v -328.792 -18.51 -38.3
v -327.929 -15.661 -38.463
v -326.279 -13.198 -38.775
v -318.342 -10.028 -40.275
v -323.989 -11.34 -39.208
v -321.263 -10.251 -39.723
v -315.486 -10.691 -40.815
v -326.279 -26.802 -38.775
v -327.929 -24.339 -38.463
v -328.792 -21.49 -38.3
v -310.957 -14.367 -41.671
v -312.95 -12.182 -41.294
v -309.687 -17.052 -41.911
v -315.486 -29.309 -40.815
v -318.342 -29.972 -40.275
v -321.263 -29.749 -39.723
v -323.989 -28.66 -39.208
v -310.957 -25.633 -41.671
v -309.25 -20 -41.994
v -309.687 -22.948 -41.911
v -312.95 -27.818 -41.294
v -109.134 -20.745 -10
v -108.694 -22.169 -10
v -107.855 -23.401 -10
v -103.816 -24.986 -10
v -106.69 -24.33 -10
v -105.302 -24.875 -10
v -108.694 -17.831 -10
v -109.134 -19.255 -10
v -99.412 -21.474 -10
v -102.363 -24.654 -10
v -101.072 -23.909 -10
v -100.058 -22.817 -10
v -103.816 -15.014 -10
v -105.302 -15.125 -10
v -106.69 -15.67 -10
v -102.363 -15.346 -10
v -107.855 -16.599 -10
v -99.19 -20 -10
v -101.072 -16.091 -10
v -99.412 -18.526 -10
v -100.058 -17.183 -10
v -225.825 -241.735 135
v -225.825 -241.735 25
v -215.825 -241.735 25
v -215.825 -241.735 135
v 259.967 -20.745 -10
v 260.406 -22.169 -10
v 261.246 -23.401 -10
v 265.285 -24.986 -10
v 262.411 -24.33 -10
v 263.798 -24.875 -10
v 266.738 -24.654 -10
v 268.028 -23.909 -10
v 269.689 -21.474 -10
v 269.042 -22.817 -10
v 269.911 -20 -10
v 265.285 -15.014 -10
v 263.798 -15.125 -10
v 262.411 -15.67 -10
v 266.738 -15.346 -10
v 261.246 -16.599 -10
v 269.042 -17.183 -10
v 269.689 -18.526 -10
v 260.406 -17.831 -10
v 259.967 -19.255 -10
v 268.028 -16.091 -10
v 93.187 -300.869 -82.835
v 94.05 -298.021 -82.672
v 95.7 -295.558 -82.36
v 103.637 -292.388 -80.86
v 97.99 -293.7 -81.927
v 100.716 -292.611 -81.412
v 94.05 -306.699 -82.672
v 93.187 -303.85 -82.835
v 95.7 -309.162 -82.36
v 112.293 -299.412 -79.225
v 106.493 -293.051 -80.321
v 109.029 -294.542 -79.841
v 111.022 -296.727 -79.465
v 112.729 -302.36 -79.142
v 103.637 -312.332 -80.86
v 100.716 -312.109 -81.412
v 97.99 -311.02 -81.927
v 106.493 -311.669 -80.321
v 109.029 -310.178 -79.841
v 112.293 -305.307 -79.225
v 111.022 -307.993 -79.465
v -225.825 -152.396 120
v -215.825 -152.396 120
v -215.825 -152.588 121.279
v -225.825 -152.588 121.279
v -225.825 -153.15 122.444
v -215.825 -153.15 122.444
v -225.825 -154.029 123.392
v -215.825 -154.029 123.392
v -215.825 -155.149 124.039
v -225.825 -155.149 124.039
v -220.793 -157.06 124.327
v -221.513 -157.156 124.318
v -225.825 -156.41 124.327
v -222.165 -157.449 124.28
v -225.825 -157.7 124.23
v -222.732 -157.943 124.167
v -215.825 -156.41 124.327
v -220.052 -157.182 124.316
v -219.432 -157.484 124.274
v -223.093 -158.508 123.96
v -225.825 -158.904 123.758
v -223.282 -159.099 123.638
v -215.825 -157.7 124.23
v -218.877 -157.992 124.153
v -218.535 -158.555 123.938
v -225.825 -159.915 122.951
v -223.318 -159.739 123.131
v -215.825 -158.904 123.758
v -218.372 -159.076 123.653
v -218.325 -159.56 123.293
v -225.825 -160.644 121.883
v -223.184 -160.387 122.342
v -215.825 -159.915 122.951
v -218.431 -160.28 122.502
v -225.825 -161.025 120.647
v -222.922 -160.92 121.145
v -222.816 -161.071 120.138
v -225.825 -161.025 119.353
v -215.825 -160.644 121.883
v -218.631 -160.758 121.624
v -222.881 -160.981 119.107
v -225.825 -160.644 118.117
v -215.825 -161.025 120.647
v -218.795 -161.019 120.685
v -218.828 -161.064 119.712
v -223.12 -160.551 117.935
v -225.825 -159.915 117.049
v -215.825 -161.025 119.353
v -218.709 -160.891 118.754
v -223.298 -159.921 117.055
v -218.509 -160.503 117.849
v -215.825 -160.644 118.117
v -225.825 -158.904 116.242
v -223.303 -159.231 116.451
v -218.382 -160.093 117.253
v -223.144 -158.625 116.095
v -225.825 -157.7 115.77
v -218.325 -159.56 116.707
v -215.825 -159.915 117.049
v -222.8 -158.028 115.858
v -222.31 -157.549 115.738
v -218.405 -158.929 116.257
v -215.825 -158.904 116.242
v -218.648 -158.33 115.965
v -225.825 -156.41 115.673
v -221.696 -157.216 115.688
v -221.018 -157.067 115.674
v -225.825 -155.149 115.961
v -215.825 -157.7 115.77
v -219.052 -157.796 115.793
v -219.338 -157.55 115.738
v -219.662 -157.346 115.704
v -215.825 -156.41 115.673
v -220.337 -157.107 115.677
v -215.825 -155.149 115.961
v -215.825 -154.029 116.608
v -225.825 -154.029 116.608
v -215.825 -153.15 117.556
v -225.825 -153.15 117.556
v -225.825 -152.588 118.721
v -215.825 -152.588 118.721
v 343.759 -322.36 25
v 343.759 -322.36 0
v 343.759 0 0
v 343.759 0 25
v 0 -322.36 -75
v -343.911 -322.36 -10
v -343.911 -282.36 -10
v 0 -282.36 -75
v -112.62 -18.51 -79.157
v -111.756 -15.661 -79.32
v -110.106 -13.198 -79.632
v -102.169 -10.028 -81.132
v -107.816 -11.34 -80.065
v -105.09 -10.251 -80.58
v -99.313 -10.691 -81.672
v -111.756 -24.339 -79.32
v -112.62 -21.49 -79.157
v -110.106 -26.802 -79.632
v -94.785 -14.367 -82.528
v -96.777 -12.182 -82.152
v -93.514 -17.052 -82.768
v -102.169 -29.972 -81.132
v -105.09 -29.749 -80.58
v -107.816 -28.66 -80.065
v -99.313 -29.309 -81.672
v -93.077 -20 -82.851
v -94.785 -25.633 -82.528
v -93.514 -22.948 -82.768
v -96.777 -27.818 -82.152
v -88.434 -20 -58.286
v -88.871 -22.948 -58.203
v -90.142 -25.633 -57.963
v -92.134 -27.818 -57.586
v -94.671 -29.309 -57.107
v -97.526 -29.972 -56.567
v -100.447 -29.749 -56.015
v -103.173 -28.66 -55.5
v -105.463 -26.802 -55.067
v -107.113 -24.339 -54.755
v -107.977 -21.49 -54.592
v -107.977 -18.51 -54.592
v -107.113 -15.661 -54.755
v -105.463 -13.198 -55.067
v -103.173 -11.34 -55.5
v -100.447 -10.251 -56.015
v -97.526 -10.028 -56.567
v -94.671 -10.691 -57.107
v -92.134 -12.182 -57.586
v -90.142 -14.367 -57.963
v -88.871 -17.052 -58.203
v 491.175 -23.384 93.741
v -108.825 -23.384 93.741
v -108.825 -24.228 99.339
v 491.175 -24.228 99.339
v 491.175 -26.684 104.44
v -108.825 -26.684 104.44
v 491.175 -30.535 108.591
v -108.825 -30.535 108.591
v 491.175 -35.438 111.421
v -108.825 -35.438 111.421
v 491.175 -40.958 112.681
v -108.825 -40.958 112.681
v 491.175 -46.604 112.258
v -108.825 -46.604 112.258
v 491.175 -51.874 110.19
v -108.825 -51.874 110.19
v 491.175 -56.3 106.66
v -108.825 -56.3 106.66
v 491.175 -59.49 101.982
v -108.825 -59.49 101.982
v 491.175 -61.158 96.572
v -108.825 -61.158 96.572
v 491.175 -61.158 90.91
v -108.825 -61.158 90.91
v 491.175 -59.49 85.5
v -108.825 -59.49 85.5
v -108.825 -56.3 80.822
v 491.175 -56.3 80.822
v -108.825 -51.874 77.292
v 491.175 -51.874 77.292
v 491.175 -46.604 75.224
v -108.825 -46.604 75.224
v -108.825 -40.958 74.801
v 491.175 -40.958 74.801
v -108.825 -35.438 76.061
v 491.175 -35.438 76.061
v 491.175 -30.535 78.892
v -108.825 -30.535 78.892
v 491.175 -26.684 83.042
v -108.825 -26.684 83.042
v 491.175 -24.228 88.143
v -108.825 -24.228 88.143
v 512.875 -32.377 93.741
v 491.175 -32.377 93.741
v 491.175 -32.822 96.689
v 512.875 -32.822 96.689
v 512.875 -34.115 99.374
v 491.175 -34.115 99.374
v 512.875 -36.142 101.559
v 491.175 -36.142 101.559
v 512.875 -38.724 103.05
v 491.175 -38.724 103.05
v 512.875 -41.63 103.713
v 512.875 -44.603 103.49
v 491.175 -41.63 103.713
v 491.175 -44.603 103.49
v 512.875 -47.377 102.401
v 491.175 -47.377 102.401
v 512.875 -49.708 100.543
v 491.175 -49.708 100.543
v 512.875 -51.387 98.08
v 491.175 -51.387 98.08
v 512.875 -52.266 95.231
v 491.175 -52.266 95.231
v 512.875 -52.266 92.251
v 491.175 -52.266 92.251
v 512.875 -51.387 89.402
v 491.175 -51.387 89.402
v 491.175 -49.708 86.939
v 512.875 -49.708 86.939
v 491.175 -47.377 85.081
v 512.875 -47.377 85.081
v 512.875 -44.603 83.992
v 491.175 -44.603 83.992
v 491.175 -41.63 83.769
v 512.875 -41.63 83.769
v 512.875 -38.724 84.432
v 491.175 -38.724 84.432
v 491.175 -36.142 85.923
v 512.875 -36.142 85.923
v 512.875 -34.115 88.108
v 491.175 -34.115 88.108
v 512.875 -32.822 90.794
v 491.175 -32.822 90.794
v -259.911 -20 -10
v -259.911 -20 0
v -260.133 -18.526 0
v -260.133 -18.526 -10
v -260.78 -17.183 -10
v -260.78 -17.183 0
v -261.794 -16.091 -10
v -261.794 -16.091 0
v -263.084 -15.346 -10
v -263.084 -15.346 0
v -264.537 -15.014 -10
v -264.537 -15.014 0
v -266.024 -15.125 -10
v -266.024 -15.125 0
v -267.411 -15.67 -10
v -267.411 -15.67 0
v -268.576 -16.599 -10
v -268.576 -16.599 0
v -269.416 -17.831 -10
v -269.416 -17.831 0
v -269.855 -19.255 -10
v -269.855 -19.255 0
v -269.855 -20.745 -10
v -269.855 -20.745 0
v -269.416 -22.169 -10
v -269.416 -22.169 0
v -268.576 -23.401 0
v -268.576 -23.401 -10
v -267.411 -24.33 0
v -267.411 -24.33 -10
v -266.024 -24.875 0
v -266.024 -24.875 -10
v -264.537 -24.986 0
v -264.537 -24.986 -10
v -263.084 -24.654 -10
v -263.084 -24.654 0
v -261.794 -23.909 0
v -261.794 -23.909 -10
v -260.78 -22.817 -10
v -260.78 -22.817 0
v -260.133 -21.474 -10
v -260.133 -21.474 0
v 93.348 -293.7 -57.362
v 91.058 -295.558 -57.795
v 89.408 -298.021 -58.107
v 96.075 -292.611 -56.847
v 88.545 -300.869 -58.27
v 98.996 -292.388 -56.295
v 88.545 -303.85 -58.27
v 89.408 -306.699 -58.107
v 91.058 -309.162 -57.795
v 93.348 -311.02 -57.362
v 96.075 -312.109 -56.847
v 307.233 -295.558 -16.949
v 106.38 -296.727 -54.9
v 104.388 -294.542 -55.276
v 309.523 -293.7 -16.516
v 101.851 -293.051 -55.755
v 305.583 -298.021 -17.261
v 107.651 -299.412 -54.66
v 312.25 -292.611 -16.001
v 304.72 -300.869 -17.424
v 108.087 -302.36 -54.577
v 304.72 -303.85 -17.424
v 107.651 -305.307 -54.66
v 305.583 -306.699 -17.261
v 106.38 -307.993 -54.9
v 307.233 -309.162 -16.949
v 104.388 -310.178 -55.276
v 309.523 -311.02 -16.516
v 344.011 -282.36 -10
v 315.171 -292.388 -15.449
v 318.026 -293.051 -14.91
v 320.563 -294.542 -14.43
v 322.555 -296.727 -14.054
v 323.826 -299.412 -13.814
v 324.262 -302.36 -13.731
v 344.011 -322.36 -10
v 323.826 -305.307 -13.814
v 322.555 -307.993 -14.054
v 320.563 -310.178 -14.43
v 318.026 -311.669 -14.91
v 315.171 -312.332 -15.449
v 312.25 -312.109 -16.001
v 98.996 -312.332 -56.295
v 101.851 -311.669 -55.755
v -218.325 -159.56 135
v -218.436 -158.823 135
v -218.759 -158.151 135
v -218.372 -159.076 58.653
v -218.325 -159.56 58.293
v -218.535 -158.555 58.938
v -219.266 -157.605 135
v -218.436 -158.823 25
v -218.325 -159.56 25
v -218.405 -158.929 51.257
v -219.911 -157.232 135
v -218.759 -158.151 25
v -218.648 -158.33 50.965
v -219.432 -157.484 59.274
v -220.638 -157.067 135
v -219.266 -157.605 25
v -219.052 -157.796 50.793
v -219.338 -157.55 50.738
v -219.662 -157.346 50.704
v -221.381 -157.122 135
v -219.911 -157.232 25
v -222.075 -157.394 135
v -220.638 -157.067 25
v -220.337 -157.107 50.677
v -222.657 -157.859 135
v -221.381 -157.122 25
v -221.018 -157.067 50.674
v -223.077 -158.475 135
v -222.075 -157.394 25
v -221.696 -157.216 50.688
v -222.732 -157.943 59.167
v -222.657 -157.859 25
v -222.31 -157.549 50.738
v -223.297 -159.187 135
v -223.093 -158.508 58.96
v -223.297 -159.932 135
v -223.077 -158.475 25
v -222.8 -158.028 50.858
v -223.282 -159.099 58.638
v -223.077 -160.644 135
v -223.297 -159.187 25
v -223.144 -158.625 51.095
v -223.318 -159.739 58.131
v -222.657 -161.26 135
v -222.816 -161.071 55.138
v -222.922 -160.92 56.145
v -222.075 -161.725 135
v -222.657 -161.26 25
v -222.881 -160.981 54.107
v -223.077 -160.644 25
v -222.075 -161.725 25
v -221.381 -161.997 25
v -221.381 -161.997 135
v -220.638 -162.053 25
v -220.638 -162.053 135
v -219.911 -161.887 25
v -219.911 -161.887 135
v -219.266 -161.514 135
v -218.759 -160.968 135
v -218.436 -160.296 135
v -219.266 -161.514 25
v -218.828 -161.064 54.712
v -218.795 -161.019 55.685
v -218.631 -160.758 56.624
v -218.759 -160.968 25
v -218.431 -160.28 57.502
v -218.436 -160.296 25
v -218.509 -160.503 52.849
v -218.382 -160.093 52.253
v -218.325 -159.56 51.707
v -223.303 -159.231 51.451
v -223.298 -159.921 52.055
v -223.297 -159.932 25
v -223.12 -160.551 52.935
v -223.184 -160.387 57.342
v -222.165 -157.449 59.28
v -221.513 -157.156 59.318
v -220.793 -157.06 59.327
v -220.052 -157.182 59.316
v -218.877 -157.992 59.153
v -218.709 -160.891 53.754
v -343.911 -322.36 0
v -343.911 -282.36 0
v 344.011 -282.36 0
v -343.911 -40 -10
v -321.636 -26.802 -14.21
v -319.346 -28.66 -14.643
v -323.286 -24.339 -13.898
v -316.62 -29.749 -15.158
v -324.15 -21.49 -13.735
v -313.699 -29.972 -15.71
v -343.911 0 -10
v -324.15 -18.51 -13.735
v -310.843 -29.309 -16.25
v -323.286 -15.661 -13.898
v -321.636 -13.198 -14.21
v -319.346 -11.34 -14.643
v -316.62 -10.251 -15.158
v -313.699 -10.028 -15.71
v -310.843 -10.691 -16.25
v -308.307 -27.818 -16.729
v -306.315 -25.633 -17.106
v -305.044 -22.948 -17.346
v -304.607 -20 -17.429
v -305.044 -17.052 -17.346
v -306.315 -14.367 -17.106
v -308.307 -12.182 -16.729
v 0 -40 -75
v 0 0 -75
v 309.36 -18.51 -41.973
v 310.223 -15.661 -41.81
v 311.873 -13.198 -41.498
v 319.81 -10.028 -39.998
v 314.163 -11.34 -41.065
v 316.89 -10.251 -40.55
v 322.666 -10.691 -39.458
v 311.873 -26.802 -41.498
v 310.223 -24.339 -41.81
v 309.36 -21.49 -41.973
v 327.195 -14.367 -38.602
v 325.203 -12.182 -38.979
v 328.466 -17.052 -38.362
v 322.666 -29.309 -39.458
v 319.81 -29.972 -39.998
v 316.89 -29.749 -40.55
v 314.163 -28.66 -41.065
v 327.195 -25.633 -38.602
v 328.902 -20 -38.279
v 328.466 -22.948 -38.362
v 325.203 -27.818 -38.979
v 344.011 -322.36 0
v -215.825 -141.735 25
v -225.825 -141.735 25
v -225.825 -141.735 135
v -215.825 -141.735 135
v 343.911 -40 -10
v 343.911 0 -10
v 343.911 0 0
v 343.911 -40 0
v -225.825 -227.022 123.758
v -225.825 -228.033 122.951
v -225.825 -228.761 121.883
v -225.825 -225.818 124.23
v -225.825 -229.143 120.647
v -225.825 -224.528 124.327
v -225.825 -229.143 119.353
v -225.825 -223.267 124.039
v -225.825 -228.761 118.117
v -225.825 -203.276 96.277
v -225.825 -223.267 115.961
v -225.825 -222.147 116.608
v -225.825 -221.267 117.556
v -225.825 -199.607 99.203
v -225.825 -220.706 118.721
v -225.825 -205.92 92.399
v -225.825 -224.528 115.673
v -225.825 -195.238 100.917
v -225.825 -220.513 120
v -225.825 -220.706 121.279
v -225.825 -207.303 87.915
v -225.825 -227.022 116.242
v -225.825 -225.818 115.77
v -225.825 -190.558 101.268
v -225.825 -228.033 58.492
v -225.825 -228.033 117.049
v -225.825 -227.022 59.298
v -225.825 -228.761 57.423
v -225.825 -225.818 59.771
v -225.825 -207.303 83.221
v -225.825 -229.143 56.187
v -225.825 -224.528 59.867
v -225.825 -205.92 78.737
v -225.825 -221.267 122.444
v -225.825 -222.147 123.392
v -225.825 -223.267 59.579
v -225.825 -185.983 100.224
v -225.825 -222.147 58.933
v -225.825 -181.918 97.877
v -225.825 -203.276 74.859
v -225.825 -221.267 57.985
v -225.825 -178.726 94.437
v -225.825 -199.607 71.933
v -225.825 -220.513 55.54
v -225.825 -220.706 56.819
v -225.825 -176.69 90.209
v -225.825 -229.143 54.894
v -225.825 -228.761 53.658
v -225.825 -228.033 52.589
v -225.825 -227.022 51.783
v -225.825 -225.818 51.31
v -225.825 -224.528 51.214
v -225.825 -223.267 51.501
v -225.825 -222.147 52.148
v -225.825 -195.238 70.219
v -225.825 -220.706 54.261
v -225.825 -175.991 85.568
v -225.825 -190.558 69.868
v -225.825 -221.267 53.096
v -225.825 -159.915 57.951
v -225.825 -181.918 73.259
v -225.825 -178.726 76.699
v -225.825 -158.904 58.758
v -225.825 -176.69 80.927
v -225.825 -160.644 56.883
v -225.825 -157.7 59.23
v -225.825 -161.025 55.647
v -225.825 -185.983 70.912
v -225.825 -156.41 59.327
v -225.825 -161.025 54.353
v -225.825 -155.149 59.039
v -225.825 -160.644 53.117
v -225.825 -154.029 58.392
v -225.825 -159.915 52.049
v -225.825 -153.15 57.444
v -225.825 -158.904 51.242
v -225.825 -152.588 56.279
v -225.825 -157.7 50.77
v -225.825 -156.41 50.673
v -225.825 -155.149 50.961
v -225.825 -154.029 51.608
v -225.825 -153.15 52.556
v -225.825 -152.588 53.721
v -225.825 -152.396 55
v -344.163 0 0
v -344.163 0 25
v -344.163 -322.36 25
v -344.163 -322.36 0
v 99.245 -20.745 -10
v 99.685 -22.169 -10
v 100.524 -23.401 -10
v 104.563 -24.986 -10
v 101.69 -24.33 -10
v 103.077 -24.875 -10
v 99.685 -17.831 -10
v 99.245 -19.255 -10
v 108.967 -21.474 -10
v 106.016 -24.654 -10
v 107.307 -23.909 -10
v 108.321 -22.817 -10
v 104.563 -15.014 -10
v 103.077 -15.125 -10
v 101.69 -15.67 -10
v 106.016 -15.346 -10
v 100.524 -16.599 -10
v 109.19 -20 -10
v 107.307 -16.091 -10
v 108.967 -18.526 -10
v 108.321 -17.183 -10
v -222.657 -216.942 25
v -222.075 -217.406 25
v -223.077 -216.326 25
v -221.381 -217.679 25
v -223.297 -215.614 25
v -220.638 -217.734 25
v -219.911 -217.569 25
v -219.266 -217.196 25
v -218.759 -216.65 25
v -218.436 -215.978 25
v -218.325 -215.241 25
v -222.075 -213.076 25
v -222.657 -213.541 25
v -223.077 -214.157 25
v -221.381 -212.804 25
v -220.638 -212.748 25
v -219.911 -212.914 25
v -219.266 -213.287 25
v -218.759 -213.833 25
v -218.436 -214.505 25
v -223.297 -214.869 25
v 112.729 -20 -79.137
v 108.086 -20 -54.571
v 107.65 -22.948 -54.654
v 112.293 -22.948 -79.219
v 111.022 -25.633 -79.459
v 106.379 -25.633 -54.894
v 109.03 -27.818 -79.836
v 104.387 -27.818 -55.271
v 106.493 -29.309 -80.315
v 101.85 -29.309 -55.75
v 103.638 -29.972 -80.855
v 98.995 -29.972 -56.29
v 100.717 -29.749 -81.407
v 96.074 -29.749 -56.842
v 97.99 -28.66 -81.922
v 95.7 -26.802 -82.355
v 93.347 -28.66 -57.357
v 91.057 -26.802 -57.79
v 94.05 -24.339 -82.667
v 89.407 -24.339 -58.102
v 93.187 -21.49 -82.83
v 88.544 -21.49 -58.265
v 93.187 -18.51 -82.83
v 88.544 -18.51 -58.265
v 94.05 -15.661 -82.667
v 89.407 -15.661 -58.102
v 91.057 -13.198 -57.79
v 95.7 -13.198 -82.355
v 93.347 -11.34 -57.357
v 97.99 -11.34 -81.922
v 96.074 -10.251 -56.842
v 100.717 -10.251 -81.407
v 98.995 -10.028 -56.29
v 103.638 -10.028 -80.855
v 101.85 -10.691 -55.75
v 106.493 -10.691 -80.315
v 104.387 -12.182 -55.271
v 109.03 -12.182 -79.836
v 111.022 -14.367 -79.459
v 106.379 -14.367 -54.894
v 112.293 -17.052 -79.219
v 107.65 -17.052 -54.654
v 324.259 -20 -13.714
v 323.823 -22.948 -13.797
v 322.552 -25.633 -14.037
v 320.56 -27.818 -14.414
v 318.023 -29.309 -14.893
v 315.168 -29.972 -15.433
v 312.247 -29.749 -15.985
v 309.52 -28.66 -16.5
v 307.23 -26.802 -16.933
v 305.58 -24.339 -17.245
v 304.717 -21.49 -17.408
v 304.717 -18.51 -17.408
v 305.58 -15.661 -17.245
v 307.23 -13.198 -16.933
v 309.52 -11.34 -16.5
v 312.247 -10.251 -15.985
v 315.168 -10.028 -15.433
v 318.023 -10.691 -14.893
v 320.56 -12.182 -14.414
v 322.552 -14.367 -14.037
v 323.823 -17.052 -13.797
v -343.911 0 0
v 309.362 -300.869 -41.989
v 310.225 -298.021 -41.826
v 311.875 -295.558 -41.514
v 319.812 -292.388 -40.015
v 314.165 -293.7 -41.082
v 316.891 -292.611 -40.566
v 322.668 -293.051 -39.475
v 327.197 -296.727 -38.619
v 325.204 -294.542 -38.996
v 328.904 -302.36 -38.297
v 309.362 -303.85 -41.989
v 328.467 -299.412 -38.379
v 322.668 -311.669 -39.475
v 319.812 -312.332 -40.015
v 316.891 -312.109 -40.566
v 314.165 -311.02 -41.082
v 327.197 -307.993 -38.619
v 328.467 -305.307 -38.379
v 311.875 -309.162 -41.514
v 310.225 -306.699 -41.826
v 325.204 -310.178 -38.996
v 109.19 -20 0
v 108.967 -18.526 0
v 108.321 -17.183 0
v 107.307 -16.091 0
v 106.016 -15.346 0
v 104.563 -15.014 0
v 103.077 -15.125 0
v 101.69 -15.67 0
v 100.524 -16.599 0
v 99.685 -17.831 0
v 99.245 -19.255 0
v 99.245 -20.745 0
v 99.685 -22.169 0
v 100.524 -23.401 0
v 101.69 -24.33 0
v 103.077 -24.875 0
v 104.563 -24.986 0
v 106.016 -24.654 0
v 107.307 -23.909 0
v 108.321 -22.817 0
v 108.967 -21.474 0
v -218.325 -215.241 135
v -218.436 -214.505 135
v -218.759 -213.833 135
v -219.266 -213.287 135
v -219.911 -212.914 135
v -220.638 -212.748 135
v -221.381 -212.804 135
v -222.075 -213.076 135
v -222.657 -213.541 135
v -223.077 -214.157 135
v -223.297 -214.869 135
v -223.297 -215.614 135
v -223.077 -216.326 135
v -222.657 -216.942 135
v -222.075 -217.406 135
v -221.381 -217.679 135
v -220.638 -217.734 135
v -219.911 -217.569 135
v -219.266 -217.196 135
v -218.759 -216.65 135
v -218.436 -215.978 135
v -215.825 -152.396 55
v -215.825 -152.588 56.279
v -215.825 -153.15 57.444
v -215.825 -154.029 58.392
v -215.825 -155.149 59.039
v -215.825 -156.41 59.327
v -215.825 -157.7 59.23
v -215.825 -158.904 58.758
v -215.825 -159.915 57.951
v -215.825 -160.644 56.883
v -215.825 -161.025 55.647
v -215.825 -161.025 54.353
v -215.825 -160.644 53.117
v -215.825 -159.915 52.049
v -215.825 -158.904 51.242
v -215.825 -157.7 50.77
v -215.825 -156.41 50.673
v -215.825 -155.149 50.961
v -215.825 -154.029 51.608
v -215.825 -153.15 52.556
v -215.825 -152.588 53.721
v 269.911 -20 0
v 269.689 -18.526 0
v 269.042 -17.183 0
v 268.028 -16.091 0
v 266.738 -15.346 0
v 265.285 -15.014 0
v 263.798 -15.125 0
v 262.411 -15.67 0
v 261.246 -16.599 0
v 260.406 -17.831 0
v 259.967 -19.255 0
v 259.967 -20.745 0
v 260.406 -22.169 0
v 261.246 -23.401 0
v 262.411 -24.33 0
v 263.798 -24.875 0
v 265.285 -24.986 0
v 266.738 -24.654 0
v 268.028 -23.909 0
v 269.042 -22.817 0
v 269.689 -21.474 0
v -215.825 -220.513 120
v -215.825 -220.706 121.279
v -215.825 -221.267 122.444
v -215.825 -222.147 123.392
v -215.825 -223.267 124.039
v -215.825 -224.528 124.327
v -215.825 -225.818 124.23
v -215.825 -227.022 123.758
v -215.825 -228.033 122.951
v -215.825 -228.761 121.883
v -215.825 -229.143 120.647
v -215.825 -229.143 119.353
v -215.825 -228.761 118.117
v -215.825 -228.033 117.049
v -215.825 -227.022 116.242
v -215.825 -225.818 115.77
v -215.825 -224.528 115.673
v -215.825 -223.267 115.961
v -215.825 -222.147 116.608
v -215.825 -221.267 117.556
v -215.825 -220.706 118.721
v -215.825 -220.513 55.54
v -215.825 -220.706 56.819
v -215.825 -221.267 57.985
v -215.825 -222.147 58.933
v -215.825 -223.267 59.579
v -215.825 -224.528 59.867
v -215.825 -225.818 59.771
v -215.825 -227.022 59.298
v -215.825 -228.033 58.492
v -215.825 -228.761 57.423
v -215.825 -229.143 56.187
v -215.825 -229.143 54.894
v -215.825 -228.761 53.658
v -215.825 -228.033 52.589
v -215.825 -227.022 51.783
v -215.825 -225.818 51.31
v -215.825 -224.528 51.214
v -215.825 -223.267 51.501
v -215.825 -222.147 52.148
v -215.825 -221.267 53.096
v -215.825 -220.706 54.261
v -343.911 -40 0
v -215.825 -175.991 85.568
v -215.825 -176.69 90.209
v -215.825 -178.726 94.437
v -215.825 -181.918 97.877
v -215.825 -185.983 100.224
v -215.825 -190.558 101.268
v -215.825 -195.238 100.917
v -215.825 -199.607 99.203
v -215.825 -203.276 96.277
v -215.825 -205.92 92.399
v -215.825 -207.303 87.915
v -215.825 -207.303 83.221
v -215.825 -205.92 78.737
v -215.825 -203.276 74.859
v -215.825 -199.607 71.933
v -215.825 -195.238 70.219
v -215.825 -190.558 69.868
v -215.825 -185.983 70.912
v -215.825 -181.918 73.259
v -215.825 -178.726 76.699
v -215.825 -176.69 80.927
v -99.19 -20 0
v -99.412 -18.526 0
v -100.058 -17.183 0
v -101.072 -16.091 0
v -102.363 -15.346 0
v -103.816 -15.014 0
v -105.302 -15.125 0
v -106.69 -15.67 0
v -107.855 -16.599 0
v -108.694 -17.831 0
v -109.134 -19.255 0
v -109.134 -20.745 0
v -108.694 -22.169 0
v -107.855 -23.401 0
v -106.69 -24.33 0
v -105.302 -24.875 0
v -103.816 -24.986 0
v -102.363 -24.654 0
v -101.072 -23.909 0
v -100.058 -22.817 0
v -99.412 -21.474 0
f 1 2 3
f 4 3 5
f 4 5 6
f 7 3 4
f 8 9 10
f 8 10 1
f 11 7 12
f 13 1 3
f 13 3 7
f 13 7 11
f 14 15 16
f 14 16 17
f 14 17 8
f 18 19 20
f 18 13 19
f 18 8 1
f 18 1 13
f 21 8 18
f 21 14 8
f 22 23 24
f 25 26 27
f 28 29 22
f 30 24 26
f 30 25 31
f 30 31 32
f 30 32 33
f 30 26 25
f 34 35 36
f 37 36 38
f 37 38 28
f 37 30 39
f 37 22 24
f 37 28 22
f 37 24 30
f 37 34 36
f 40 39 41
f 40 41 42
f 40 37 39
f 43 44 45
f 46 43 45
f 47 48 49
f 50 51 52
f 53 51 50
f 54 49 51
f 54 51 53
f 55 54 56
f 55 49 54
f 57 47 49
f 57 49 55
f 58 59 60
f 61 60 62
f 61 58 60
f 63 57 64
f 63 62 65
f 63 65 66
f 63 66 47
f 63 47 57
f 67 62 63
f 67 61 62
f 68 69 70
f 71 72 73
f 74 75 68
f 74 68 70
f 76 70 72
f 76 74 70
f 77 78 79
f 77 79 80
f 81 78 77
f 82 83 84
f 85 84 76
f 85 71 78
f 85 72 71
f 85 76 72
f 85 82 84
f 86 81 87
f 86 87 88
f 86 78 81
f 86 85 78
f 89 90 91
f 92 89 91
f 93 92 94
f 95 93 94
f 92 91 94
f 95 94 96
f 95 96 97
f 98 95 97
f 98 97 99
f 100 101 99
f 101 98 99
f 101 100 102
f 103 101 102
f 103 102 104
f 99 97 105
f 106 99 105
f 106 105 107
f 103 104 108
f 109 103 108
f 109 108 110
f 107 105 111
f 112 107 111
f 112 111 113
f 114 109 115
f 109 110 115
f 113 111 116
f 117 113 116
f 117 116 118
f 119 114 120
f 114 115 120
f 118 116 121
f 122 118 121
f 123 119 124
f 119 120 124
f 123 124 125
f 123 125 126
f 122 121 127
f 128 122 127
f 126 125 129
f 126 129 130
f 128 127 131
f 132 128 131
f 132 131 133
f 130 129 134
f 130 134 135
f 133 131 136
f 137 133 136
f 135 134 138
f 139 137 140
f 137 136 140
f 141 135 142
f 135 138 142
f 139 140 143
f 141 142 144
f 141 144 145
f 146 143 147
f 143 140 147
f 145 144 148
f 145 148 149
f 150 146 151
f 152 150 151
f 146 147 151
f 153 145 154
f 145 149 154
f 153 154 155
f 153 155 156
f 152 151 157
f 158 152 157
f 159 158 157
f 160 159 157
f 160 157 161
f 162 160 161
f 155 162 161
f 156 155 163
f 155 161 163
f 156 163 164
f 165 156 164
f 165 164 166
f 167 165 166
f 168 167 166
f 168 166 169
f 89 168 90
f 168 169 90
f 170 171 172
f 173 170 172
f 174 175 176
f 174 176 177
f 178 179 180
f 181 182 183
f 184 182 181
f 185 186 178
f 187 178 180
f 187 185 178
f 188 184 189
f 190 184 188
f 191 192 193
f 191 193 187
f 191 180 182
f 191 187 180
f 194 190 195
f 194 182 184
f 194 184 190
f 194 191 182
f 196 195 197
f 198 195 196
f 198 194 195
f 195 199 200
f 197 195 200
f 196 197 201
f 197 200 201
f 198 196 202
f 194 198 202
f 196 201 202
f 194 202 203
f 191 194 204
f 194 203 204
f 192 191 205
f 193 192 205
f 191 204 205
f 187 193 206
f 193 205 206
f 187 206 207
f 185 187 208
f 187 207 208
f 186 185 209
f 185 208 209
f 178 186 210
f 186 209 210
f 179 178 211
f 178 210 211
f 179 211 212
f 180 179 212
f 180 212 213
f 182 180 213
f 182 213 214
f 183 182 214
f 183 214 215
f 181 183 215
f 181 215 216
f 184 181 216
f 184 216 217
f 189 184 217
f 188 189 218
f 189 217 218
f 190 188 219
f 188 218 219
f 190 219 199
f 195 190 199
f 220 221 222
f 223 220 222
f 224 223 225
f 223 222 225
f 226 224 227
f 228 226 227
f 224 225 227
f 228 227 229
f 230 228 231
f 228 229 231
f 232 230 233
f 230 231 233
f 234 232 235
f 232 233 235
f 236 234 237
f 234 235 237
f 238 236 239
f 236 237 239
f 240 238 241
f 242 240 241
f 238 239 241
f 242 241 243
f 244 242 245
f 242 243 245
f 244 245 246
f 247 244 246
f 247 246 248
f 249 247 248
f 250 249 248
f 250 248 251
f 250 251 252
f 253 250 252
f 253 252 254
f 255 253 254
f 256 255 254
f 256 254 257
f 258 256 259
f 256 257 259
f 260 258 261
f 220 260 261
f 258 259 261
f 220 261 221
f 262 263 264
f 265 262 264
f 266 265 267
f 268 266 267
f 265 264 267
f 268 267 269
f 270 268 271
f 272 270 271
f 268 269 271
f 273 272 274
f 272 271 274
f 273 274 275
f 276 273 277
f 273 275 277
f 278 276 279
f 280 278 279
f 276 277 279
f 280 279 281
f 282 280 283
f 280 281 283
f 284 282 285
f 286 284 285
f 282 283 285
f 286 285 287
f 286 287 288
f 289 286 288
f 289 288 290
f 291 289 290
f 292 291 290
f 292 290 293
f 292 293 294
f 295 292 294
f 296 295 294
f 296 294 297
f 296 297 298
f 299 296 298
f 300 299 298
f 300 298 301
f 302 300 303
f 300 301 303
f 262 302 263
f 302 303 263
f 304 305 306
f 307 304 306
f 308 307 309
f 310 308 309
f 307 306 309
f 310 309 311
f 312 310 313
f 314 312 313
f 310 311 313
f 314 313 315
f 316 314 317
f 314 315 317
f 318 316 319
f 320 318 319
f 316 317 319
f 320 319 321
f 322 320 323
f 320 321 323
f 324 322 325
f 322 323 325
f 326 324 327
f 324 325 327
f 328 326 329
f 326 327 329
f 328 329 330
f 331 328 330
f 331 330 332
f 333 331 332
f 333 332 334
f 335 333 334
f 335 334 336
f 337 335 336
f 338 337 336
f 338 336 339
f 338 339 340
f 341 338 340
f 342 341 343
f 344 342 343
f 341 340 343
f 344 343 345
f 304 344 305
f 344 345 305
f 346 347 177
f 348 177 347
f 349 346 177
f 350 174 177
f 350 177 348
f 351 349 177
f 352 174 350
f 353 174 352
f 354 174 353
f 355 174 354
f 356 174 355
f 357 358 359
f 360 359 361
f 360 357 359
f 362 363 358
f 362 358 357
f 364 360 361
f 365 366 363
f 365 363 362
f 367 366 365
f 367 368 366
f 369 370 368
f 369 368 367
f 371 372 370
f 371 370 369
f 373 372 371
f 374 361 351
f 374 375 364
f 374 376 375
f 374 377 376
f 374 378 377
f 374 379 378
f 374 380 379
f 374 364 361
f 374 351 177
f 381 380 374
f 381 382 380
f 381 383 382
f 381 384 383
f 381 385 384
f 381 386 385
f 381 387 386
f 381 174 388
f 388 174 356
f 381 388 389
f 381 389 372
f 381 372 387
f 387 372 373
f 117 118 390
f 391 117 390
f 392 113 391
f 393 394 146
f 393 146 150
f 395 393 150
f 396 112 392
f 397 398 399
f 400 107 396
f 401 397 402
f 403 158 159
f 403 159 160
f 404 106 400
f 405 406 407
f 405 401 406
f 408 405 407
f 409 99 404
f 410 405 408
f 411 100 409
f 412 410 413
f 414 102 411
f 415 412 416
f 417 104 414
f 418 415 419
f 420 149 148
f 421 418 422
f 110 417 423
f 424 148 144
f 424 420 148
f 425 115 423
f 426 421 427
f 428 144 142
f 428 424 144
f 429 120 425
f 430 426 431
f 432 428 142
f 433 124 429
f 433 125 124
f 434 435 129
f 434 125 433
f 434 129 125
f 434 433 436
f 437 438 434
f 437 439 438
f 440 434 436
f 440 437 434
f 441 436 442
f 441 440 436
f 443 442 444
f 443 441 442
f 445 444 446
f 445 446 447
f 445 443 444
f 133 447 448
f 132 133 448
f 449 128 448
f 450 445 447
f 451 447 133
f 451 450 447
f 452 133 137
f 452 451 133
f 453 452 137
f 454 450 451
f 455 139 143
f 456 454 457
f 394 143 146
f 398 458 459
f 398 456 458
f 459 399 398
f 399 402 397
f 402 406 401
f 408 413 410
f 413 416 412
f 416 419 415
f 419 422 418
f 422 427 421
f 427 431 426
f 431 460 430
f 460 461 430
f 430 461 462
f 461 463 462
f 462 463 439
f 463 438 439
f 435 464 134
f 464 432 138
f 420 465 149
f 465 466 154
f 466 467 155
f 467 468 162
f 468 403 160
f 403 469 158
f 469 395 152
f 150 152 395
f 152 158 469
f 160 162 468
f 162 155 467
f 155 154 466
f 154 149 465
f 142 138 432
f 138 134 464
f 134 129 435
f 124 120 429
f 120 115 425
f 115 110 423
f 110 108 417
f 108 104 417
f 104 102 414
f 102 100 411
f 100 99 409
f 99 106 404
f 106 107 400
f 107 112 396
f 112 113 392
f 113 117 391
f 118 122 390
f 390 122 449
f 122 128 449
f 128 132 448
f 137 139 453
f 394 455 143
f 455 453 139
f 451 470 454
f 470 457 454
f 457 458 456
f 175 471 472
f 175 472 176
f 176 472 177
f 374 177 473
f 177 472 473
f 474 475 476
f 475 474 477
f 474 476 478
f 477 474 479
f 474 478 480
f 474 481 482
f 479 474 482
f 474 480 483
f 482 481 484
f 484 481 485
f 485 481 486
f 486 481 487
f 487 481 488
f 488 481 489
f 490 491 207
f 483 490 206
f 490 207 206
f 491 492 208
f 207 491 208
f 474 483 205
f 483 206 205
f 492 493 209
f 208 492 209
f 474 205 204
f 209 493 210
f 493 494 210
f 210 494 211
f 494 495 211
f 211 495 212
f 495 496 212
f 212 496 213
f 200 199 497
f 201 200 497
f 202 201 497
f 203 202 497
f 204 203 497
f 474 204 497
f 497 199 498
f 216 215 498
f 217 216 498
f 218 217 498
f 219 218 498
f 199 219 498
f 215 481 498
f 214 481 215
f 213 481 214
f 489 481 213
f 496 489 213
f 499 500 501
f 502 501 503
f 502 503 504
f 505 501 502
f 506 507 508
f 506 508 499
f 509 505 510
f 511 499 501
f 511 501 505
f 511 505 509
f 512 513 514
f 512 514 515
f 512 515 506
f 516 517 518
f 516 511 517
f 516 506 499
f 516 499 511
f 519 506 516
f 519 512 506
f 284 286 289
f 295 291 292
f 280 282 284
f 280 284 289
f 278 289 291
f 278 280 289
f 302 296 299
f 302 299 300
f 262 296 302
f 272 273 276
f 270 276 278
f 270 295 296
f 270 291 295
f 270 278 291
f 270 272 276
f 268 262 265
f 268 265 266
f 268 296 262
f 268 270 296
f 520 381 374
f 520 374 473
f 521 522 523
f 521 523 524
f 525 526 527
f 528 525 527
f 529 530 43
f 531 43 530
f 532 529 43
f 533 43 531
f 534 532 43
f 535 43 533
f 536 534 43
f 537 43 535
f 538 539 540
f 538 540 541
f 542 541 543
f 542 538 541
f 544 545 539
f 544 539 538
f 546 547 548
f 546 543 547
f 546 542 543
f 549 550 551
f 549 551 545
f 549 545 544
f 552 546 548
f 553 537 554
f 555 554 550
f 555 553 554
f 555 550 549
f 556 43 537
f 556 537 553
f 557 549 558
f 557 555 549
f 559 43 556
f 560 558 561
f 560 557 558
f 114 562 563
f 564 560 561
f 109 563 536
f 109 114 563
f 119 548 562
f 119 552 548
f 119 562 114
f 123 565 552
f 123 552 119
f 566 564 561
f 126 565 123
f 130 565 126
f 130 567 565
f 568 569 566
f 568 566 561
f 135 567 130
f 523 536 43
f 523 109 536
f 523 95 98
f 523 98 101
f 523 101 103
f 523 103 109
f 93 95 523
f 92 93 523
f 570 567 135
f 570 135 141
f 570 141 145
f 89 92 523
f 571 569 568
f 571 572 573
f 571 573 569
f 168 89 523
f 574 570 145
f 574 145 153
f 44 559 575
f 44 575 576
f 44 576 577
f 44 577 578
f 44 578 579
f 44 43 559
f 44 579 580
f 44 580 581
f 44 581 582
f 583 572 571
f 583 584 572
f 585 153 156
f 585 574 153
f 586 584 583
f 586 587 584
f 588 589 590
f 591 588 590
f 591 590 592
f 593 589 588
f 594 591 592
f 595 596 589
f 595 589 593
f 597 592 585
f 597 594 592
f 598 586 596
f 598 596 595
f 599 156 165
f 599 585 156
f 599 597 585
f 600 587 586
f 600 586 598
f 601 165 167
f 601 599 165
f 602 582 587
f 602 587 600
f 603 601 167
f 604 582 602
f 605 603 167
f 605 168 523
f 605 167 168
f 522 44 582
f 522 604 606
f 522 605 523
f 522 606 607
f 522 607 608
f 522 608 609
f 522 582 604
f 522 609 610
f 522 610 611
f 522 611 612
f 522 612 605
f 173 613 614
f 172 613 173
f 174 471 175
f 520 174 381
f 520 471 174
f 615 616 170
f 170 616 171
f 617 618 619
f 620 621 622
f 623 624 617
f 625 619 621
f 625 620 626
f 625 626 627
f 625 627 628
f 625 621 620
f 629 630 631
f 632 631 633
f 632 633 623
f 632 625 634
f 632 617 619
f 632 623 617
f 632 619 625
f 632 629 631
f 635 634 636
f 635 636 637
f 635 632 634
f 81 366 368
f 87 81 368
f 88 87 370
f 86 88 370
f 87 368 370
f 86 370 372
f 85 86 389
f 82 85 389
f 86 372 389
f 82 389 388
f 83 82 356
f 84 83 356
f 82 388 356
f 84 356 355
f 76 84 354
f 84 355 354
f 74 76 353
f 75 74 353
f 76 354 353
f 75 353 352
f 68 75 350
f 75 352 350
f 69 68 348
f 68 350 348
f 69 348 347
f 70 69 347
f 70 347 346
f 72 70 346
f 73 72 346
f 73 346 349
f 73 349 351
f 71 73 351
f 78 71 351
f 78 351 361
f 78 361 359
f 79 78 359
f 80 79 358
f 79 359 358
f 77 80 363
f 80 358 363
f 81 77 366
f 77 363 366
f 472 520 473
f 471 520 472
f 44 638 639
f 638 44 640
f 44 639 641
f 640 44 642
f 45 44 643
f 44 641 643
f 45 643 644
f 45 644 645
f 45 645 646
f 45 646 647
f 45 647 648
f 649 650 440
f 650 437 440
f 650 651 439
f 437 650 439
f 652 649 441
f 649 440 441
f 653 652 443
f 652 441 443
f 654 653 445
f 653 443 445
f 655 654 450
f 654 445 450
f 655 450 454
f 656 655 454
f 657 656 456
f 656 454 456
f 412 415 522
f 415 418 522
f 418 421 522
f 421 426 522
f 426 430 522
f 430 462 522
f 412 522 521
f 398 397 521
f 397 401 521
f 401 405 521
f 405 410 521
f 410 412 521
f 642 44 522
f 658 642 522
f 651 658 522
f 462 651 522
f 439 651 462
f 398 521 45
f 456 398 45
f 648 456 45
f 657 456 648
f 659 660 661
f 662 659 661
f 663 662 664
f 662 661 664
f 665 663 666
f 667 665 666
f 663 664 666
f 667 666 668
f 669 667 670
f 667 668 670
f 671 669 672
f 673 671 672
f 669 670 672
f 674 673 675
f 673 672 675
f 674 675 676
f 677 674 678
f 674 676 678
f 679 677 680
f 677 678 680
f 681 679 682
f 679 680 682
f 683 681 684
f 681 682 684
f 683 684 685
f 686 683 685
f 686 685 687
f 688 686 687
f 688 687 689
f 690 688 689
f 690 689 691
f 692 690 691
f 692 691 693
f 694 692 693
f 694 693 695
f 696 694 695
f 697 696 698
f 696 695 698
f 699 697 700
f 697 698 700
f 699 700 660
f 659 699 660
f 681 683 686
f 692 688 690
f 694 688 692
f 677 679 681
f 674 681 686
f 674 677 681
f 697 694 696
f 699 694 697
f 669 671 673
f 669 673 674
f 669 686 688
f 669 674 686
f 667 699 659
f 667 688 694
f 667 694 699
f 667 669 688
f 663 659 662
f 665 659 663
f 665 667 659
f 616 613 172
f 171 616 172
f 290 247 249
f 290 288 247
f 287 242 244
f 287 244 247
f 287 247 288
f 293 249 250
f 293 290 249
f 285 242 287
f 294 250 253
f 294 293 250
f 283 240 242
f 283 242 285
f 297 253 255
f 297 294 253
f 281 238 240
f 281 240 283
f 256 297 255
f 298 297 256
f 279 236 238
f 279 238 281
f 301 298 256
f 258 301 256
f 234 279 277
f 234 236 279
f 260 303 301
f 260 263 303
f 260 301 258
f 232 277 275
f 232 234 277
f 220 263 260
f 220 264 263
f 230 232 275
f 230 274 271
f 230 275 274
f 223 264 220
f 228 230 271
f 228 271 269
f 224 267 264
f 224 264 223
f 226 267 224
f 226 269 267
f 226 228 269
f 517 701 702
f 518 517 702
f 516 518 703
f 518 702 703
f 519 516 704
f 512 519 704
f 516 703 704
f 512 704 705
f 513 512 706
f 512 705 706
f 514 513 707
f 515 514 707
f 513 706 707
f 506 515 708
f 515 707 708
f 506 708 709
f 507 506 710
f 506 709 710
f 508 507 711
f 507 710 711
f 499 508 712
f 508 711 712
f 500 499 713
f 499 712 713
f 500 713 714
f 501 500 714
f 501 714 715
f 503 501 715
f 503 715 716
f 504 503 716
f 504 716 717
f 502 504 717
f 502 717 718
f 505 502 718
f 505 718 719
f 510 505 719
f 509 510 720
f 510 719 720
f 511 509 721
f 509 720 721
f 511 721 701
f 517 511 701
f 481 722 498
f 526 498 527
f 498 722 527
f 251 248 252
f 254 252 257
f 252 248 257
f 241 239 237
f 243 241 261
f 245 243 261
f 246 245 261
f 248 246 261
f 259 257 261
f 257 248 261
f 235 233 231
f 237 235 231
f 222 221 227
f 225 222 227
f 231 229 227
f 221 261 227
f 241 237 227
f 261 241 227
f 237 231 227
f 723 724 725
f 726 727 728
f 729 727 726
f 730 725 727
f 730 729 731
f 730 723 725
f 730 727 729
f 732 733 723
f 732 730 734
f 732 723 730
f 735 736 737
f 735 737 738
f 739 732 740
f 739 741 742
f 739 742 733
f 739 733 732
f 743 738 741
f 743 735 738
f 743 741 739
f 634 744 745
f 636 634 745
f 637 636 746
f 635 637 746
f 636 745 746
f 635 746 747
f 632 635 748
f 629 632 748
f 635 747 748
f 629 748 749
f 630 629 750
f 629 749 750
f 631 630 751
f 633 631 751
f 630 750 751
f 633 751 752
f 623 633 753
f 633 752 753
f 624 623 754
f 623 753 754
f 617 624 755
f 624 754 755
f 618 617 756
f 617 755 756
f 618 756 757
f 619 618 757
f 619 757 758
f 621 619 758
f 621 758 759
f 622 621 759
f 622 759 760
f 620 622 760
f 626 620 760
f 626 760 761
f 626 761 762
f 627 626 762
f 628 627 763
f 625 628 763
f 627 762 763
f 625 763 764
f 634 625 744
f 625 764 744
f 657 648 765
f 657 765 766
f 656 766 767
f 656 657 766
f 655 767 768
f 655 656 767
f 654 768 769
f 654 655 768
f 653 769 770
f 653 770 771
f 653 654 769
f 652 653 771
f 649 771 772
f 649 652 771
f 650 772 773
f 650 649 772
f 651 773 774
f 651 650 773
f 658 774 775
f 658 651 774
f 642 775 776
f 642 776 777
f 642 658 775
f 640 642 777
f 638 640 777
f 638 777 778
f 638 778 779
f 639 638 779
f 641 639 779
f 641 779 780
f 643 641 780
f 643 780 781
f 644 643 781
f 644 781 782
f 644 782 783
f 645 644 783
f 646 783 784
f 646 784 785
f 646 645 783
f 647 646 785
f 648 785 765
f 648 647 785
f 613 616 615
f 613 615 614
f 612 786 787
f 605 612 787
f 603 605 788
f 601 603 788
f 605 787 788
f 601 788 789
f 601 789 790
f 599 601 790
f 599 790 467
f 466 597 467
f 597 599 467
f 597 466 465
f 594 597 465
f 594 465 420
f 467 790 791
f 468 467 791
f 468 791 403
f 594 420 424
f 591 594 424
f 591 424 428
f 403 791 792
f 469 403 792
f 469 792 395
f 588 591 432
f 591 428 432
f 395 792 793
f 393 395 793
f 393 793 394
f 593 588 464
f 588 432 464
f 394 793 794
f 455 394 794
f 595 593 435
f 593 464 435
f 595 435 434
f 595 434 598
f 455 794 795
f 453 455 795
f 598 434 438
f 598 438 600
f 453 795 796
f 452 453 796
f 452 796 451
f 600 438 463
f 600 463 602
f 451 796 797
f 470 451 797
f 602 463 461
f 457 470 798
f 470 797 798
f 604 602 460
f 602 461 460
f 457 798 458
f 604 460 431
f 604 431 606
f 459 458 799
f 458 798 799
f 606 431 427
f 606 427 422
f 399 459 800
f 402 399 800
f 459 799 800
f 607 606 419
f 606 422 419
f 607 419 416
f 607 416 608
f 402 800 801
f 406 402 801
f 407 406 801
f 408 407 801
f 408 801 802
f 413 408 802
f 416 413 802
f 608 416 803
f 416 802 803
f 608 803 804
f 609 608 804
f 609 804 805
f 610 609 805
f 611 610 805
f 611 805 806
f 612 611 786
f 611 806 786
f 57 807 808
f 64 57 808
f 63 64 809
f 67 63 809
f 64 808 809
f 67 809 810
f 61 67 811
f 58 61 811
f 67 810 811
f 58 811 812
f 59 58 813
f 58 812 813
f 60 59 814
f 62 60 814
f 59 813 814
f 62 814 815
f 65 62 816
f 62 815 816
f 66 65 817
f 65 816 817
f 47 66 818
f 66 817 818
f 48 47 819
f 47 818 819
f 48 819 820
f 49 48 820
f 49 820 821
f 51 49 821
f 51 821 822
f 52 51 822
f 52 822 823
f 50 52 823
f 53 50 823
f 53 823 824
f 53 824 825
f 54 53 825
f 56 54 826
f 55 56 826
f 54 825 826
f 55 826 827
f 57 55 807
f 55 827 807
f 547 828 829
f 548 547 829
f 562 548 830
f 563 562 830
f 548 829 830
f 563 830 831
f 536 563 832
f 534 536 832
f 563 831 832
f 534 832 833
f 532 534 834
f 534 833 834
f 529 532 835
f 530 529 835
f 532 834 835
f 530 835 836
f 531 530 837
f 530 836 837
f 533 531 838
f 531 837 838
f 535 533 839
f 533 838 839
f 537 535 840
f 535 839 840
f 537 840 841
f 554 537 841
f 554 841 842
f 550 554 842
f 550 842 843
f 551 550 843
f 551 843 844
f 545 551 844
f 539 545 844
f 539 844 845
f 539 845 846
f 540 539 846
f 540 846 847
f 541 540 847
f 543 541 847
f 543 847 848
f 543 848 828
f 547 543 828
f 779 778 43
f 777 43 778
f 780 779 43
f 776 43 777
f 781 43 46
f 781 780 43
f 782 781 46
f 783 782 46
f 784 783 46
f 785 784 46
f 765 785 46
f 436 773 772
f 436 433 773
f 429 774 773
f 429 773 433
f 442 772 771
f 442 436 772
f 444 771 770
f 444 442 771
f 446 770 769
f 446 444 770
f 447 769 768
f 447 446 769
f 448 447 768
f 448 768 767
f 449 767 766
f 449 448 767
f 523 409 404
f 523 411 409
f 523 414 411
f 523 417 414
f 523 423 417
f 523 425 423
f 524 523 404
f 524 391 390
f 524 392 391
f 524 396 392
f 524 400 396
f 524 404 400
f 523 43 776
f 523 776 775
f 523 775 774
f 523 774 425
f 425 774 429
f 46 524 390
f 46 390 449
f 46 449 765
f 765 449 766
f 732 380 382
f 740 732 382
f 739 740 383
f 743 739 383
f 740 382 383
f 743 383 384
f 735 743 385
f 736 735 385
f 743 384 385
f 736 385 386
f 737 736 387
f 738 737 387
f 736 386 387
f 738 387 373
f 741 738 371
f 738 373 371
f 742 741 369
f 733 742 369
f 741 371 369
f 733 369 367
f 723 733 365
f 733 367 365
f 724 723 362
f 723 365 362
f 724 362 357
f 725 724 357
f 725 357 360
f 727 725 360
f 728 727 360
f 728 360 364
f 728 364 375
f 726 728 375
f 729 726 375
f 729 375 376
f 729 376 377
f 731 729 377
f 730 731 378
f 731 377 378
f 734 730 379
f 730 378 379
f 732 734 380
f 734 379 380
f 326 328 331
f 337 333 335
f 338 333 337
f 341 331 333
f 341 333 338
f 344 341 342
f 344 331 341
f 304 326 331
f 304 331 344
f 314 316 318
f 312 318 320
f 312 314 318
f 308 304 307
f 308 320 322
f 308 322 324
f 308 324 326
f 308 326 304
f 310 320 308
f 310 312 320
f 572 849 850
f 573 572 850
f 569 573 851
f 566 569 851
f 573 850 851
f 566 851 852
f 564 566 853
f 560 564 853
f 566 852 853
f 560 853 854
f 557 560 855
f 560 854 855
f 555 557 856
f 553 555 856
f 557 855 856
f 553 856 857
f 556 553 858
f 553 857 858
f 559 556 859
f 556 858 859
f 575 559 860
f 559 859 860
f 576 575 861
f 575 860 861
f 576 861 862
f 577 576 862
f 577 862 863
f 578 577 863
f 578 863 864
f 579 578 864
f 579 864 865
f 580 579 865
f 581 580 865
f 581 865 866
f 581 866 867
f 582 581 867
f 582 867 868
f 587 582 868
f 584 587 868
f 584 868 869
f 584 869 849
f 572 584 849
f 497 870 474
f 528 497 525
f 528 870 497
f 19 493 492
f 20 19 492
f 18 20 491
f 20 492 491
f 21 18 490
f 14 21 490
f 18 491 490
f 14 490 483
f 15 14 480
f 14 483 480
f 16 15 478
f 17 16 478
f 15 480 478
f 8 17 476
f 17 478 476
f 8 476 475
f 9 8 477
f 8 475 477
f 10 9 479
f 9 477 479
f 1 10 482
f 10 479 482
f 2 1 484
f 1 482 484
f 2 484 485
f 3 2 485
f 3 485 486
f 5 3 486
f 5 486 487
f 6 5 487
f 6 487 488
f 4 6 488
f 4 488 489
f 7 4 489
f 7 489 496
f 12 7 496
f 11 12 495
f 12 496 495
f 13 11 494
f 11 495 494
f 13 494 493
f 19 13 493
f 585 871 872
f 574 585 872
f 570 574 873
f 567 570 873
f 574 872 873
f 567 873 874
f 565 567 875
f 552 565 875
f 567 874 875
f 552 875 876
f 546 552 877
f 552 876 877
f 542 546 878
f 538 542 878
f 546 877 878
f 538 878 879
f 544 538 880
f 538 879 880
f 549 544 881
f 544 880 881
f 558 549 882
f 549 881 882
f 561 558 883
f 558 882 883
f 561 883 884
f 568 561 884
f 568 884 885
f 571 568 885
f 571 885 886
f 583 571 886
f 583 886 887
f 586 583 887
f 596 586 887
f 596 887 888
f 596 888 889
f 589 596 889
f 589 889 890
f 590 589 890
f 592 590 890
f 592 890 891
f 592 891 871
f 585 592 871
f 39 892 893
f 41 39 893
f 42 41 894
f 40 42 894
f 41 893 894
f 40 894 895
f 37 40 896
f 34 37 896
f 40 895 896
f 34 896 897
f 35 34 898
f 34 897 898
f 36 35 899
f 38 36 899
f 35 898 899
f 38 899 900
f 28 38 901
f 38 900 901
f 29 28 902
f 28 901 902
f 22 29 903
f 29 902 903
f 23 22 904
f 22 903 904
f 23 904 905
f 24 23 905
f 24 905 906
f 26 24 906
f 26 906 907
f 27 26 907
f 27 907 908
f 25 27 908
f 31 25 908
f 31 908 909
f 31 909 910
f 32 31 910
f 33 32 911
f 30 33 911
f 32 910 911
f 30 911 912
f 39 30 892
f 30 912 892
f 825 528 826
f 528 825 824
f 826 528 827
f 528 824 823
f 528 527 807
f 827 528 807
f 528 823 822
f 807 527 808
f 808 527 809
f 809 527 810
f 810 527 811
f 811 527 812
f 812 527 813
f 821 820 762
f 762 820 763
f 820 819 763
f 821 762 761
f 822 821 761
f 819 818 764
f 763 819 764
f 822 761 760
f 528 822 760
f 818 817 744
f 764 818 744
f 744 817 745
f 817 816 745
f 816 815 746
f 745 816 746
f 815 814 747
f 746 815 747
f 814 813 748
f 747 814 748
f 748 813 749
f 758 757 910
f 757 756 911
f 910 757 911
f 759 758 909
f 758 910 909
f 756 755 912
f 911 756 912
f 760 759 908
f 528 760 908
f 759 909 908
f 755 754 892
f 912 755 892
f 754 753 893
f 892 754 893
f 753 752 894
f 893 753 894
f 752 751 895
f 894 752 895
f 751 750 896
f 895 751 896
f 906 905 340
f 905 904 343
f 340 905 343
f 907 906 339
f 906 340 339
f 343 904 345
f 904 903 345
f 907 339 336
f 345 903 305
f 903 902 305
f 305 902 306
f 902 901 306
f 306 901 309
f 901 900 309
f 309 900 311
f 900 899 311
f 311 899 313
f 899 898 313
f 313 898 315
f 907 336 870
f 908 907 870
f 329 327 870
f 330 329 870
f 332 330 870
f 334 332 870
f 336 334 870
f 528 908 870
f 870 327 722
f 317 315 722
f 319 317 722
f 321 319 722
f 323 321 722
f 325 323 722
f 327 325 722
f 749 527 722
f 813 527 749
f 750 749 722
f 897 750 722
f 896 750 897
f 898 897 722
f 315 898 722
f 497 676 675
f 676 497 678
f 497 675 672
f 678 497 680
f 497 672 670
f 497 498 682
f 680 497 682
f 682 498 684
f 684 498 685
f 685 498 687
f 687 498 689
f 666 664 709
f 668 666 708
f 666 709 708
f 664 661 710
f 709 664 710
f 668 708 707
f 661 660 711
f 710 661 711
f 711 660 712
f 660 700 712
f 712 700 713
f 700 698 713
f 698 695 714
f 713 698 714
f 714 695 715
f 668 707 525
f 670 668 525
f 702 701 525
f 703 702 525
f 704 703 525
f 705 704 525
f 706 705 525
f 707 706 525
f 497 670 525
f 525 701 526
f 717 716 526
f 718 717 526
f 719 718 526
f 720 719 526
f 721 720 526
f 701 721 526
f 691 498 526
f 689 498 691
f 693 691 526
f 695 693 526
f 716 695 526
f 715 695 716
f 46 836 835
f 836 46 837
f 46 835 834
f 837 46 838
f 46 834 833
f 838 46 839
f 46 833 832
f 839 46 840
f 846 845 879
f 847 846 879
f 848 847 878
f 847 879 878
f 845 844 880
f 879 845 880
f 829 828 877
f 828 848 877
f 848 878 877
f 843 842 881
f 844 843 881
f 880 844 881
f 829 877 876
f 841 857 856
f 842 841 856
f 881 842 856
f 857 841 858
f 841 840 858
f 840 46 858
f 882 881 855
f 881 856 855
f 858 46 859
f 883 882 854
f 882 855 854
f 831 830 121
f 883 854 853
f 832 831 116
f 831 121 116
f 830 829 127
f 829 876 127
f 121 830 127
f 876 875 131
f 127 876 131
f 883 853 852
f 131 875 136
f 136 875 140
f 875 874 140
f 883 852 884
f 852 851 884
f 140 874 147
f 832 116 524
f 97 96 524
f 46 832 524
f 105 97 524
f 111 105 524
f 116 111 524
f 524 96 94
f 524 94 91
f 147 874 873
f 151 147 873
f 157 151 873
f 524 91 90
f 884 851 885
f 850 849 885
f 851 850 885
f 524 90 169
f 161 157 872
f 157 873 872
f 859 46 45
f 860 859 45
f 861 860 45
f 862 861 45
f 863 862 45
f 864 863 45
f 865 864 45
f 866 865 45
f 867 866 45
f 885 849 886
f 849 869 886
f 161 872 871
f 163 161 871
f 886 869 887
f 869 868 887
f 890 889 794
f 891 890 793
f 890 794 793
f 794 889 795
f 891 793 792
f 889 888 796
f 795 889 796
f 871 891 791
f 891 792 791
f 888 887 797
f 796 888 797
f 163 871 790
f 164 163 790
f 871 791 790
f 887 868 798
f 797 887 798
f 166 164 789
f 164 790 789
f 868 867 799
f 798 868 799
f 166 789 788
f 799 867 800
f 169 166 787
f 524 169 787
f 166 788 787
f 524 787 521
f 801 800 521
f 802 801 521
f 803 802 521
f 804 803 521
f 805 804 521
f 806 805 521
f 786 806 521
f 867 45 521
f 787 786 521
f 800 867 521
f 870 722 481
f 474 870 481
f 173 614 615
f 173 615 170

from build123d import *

# Parameters (mm, degrees)
F1_DEPTH  = 40
F2_R      = 5
F3_DEPTH  = 10
F4_R      = 10
F5_DEPTH  = 25
F6_R      = 10
F7_DEPTH  = 25
F8_W      = 687.9218816757
F8_H      = 322.3598301411
F9_DEPTH  = 25
F11_DEPTH = 40
F12_R     = 10
F13_DEPTH = 25
F14_W     = 10
F14_H     = 100
F14_R     = 2.5
F15_DEPTH = 110
F16_R     = 4.3389942533
F16_R_2   = 15.7440759203
F17_DEPTH = 66
F20_R     = 18.9932010267
F21_DEPTH = 600
F22_R     = 10
F23_DEPTH = 21.7


# Not quite as in the source:
# - the program builds the solid bodies; features that only make, move or delete a surface that nothing else refers to are left out


with BuildPart() as f1:
    # F0 (on Front) → F1 (new body)
    with BuildSketch(Plane.XZ):
        Polygon((343.9113257804, 0), (-343.9113257804, 0), (-343.9113257804, -10), (0, -75), (343.9113257804, -10), align=None)
    extrude(amount=F1_DEPTH)

    # F2 (on face) → F3 (cut)
    with BuildSketch(Plane.XY):
        with Locations((-264.9109515785, -20)):
            Circle(F2_R)
        with Locations((-104.1895777367, -20)):
            Circle(F2_R)
        with Locations((104.1895777367, -20)):
            Circle(F2_R)
        with Locations((264.9109515785, -20)):
            Circle(F2_R)
    extrude(amount=-F3_DEPTH, mode=Mode.SUBTRACT)

    # F4 (on face) → F5 (join)
    with BuildSketch(Plane(origin=(-13.6862670464, 0, -72.4132653061), x_dir=(0.9826037879, 0, -0.1857142857), z_dir=(-0.1857142857, 0, -0.9826037879))):
        with Locations((-306.0714285714, 20)):
            Circle(F4_R)
        with Locations((-86.0714285714, 20)):
            Circle(F4_R)
    extrude(amount=F5_DEPTH)

    # F6 (on face) → F7 (join)
    with BuildSketch(Plane(origin=(13.6862670464, 0, -72.4132653061), x_dir=(0.9826037879, 0, 0.1857142857), z_dir=(0.1857142857, 0, -0.9826037879))):
        with Locations((306.0714285714, 20)):
            Circle(F6_R)
        with Locations((86.0714285714, 20)):
            Circle(F6_R)
    extrude(amount=F7_DEPTH)


with BuildPart() as f9:
    # F8 (on Top) → F9 (new body)
    with BuildSketch(Plane.XY):
        with Locations((-0.2017915249, -161.1799150705)):
            Rectangle(F8_W, F8_H)
    extrude(amount=F9_DEPTH)


with BuildPart() as f11:
    # F10 (on face) → F11 (new body)
    with BuildSketch(Plane.XZ.offset(322.3598301411)):
        Polygon((344.0105558954, 0), (-343.9113257804, 0), (-343.9113257804, -10), (0, -75), (344.0105558954, -10), align=None)
    extrude(amount=-F11_DEPTH)

    # F12 (on face) → F13 (join)
    with BuildSketch(Plane(origin=(13.6825914381, 0, -72.4147059495), x_dir=(0.9826135622, 0, 0.1856625631), z_dir=(0.1856625631, 0, -0.9826135622))):
        with Locations((306.0753077668, 302.3598301411)):
            Circle(F12_R)
        with Locations((86.0753077668, 302.3598301411)):
            Circle(F12_R)
    extrude(amount=F13_DEPTH)


with BuildPart() as f15:
    # F14 (on face) → F15 (new body)
    with BuildSketch(Plane.XY.offset(25)):
        with Locations((-220.8246585727, -191.7345849391)):
            Rectangle(F14_W, F14_H)
        with Locations((-220.8246585727, -215.2414023876)):
            Circle(F14_R, mode=Mode.SUBTRACT)
        with Locations((-220.8246585727, -159.5595628023)):
            Circle(F14_R, mode=Mode.SUBTRACT)
    extrude(amount=F15_DEPTH)

    # F16 (on face) → F17 (cut)
    with BuildSketch(Plane.YZ.offset(-215.8246585727)):
        with Locations((-156.7345849391, 120)):
            Circle(F16_R)
        with Locations((-156.7345849391, 55)):
            Circle(F16_R)
        with Locations((-224.8520583823, 120)):
            Circle(F16_R)
        with Locations((-224.8520583823, 55.5403646578)):
            Circle(F16_R)
        with Locations((-191.7345849391, 85.5679959059)):
            Circle(F16_R_2)
    extrude(amount=-F17_DEPTH, mode=Mode.SUBTRACT)


with BuildPart() as f21:
    # F20 (on offset) → F21 (new body)
    with BuildSketch(Plane.YZ.offset(-108.8246585727)):
        with Locations((-42.3773415387, 93.7410518527)):
            Circle(F20_R)
    extrude(amount=F21_DEPTH)

    # F22 (on face) → F23 (join)
    with BuildSketch(Plane.YZ.offset(491.1753414273)):
        with Locations((-42.3773415387, 93.7410518527)):
            Circle(F22_R)
    extrude(amount=F23_DEPTH)


solid = Compound([f1.part, f9.part, f11.part, f15.part, f21.part])
